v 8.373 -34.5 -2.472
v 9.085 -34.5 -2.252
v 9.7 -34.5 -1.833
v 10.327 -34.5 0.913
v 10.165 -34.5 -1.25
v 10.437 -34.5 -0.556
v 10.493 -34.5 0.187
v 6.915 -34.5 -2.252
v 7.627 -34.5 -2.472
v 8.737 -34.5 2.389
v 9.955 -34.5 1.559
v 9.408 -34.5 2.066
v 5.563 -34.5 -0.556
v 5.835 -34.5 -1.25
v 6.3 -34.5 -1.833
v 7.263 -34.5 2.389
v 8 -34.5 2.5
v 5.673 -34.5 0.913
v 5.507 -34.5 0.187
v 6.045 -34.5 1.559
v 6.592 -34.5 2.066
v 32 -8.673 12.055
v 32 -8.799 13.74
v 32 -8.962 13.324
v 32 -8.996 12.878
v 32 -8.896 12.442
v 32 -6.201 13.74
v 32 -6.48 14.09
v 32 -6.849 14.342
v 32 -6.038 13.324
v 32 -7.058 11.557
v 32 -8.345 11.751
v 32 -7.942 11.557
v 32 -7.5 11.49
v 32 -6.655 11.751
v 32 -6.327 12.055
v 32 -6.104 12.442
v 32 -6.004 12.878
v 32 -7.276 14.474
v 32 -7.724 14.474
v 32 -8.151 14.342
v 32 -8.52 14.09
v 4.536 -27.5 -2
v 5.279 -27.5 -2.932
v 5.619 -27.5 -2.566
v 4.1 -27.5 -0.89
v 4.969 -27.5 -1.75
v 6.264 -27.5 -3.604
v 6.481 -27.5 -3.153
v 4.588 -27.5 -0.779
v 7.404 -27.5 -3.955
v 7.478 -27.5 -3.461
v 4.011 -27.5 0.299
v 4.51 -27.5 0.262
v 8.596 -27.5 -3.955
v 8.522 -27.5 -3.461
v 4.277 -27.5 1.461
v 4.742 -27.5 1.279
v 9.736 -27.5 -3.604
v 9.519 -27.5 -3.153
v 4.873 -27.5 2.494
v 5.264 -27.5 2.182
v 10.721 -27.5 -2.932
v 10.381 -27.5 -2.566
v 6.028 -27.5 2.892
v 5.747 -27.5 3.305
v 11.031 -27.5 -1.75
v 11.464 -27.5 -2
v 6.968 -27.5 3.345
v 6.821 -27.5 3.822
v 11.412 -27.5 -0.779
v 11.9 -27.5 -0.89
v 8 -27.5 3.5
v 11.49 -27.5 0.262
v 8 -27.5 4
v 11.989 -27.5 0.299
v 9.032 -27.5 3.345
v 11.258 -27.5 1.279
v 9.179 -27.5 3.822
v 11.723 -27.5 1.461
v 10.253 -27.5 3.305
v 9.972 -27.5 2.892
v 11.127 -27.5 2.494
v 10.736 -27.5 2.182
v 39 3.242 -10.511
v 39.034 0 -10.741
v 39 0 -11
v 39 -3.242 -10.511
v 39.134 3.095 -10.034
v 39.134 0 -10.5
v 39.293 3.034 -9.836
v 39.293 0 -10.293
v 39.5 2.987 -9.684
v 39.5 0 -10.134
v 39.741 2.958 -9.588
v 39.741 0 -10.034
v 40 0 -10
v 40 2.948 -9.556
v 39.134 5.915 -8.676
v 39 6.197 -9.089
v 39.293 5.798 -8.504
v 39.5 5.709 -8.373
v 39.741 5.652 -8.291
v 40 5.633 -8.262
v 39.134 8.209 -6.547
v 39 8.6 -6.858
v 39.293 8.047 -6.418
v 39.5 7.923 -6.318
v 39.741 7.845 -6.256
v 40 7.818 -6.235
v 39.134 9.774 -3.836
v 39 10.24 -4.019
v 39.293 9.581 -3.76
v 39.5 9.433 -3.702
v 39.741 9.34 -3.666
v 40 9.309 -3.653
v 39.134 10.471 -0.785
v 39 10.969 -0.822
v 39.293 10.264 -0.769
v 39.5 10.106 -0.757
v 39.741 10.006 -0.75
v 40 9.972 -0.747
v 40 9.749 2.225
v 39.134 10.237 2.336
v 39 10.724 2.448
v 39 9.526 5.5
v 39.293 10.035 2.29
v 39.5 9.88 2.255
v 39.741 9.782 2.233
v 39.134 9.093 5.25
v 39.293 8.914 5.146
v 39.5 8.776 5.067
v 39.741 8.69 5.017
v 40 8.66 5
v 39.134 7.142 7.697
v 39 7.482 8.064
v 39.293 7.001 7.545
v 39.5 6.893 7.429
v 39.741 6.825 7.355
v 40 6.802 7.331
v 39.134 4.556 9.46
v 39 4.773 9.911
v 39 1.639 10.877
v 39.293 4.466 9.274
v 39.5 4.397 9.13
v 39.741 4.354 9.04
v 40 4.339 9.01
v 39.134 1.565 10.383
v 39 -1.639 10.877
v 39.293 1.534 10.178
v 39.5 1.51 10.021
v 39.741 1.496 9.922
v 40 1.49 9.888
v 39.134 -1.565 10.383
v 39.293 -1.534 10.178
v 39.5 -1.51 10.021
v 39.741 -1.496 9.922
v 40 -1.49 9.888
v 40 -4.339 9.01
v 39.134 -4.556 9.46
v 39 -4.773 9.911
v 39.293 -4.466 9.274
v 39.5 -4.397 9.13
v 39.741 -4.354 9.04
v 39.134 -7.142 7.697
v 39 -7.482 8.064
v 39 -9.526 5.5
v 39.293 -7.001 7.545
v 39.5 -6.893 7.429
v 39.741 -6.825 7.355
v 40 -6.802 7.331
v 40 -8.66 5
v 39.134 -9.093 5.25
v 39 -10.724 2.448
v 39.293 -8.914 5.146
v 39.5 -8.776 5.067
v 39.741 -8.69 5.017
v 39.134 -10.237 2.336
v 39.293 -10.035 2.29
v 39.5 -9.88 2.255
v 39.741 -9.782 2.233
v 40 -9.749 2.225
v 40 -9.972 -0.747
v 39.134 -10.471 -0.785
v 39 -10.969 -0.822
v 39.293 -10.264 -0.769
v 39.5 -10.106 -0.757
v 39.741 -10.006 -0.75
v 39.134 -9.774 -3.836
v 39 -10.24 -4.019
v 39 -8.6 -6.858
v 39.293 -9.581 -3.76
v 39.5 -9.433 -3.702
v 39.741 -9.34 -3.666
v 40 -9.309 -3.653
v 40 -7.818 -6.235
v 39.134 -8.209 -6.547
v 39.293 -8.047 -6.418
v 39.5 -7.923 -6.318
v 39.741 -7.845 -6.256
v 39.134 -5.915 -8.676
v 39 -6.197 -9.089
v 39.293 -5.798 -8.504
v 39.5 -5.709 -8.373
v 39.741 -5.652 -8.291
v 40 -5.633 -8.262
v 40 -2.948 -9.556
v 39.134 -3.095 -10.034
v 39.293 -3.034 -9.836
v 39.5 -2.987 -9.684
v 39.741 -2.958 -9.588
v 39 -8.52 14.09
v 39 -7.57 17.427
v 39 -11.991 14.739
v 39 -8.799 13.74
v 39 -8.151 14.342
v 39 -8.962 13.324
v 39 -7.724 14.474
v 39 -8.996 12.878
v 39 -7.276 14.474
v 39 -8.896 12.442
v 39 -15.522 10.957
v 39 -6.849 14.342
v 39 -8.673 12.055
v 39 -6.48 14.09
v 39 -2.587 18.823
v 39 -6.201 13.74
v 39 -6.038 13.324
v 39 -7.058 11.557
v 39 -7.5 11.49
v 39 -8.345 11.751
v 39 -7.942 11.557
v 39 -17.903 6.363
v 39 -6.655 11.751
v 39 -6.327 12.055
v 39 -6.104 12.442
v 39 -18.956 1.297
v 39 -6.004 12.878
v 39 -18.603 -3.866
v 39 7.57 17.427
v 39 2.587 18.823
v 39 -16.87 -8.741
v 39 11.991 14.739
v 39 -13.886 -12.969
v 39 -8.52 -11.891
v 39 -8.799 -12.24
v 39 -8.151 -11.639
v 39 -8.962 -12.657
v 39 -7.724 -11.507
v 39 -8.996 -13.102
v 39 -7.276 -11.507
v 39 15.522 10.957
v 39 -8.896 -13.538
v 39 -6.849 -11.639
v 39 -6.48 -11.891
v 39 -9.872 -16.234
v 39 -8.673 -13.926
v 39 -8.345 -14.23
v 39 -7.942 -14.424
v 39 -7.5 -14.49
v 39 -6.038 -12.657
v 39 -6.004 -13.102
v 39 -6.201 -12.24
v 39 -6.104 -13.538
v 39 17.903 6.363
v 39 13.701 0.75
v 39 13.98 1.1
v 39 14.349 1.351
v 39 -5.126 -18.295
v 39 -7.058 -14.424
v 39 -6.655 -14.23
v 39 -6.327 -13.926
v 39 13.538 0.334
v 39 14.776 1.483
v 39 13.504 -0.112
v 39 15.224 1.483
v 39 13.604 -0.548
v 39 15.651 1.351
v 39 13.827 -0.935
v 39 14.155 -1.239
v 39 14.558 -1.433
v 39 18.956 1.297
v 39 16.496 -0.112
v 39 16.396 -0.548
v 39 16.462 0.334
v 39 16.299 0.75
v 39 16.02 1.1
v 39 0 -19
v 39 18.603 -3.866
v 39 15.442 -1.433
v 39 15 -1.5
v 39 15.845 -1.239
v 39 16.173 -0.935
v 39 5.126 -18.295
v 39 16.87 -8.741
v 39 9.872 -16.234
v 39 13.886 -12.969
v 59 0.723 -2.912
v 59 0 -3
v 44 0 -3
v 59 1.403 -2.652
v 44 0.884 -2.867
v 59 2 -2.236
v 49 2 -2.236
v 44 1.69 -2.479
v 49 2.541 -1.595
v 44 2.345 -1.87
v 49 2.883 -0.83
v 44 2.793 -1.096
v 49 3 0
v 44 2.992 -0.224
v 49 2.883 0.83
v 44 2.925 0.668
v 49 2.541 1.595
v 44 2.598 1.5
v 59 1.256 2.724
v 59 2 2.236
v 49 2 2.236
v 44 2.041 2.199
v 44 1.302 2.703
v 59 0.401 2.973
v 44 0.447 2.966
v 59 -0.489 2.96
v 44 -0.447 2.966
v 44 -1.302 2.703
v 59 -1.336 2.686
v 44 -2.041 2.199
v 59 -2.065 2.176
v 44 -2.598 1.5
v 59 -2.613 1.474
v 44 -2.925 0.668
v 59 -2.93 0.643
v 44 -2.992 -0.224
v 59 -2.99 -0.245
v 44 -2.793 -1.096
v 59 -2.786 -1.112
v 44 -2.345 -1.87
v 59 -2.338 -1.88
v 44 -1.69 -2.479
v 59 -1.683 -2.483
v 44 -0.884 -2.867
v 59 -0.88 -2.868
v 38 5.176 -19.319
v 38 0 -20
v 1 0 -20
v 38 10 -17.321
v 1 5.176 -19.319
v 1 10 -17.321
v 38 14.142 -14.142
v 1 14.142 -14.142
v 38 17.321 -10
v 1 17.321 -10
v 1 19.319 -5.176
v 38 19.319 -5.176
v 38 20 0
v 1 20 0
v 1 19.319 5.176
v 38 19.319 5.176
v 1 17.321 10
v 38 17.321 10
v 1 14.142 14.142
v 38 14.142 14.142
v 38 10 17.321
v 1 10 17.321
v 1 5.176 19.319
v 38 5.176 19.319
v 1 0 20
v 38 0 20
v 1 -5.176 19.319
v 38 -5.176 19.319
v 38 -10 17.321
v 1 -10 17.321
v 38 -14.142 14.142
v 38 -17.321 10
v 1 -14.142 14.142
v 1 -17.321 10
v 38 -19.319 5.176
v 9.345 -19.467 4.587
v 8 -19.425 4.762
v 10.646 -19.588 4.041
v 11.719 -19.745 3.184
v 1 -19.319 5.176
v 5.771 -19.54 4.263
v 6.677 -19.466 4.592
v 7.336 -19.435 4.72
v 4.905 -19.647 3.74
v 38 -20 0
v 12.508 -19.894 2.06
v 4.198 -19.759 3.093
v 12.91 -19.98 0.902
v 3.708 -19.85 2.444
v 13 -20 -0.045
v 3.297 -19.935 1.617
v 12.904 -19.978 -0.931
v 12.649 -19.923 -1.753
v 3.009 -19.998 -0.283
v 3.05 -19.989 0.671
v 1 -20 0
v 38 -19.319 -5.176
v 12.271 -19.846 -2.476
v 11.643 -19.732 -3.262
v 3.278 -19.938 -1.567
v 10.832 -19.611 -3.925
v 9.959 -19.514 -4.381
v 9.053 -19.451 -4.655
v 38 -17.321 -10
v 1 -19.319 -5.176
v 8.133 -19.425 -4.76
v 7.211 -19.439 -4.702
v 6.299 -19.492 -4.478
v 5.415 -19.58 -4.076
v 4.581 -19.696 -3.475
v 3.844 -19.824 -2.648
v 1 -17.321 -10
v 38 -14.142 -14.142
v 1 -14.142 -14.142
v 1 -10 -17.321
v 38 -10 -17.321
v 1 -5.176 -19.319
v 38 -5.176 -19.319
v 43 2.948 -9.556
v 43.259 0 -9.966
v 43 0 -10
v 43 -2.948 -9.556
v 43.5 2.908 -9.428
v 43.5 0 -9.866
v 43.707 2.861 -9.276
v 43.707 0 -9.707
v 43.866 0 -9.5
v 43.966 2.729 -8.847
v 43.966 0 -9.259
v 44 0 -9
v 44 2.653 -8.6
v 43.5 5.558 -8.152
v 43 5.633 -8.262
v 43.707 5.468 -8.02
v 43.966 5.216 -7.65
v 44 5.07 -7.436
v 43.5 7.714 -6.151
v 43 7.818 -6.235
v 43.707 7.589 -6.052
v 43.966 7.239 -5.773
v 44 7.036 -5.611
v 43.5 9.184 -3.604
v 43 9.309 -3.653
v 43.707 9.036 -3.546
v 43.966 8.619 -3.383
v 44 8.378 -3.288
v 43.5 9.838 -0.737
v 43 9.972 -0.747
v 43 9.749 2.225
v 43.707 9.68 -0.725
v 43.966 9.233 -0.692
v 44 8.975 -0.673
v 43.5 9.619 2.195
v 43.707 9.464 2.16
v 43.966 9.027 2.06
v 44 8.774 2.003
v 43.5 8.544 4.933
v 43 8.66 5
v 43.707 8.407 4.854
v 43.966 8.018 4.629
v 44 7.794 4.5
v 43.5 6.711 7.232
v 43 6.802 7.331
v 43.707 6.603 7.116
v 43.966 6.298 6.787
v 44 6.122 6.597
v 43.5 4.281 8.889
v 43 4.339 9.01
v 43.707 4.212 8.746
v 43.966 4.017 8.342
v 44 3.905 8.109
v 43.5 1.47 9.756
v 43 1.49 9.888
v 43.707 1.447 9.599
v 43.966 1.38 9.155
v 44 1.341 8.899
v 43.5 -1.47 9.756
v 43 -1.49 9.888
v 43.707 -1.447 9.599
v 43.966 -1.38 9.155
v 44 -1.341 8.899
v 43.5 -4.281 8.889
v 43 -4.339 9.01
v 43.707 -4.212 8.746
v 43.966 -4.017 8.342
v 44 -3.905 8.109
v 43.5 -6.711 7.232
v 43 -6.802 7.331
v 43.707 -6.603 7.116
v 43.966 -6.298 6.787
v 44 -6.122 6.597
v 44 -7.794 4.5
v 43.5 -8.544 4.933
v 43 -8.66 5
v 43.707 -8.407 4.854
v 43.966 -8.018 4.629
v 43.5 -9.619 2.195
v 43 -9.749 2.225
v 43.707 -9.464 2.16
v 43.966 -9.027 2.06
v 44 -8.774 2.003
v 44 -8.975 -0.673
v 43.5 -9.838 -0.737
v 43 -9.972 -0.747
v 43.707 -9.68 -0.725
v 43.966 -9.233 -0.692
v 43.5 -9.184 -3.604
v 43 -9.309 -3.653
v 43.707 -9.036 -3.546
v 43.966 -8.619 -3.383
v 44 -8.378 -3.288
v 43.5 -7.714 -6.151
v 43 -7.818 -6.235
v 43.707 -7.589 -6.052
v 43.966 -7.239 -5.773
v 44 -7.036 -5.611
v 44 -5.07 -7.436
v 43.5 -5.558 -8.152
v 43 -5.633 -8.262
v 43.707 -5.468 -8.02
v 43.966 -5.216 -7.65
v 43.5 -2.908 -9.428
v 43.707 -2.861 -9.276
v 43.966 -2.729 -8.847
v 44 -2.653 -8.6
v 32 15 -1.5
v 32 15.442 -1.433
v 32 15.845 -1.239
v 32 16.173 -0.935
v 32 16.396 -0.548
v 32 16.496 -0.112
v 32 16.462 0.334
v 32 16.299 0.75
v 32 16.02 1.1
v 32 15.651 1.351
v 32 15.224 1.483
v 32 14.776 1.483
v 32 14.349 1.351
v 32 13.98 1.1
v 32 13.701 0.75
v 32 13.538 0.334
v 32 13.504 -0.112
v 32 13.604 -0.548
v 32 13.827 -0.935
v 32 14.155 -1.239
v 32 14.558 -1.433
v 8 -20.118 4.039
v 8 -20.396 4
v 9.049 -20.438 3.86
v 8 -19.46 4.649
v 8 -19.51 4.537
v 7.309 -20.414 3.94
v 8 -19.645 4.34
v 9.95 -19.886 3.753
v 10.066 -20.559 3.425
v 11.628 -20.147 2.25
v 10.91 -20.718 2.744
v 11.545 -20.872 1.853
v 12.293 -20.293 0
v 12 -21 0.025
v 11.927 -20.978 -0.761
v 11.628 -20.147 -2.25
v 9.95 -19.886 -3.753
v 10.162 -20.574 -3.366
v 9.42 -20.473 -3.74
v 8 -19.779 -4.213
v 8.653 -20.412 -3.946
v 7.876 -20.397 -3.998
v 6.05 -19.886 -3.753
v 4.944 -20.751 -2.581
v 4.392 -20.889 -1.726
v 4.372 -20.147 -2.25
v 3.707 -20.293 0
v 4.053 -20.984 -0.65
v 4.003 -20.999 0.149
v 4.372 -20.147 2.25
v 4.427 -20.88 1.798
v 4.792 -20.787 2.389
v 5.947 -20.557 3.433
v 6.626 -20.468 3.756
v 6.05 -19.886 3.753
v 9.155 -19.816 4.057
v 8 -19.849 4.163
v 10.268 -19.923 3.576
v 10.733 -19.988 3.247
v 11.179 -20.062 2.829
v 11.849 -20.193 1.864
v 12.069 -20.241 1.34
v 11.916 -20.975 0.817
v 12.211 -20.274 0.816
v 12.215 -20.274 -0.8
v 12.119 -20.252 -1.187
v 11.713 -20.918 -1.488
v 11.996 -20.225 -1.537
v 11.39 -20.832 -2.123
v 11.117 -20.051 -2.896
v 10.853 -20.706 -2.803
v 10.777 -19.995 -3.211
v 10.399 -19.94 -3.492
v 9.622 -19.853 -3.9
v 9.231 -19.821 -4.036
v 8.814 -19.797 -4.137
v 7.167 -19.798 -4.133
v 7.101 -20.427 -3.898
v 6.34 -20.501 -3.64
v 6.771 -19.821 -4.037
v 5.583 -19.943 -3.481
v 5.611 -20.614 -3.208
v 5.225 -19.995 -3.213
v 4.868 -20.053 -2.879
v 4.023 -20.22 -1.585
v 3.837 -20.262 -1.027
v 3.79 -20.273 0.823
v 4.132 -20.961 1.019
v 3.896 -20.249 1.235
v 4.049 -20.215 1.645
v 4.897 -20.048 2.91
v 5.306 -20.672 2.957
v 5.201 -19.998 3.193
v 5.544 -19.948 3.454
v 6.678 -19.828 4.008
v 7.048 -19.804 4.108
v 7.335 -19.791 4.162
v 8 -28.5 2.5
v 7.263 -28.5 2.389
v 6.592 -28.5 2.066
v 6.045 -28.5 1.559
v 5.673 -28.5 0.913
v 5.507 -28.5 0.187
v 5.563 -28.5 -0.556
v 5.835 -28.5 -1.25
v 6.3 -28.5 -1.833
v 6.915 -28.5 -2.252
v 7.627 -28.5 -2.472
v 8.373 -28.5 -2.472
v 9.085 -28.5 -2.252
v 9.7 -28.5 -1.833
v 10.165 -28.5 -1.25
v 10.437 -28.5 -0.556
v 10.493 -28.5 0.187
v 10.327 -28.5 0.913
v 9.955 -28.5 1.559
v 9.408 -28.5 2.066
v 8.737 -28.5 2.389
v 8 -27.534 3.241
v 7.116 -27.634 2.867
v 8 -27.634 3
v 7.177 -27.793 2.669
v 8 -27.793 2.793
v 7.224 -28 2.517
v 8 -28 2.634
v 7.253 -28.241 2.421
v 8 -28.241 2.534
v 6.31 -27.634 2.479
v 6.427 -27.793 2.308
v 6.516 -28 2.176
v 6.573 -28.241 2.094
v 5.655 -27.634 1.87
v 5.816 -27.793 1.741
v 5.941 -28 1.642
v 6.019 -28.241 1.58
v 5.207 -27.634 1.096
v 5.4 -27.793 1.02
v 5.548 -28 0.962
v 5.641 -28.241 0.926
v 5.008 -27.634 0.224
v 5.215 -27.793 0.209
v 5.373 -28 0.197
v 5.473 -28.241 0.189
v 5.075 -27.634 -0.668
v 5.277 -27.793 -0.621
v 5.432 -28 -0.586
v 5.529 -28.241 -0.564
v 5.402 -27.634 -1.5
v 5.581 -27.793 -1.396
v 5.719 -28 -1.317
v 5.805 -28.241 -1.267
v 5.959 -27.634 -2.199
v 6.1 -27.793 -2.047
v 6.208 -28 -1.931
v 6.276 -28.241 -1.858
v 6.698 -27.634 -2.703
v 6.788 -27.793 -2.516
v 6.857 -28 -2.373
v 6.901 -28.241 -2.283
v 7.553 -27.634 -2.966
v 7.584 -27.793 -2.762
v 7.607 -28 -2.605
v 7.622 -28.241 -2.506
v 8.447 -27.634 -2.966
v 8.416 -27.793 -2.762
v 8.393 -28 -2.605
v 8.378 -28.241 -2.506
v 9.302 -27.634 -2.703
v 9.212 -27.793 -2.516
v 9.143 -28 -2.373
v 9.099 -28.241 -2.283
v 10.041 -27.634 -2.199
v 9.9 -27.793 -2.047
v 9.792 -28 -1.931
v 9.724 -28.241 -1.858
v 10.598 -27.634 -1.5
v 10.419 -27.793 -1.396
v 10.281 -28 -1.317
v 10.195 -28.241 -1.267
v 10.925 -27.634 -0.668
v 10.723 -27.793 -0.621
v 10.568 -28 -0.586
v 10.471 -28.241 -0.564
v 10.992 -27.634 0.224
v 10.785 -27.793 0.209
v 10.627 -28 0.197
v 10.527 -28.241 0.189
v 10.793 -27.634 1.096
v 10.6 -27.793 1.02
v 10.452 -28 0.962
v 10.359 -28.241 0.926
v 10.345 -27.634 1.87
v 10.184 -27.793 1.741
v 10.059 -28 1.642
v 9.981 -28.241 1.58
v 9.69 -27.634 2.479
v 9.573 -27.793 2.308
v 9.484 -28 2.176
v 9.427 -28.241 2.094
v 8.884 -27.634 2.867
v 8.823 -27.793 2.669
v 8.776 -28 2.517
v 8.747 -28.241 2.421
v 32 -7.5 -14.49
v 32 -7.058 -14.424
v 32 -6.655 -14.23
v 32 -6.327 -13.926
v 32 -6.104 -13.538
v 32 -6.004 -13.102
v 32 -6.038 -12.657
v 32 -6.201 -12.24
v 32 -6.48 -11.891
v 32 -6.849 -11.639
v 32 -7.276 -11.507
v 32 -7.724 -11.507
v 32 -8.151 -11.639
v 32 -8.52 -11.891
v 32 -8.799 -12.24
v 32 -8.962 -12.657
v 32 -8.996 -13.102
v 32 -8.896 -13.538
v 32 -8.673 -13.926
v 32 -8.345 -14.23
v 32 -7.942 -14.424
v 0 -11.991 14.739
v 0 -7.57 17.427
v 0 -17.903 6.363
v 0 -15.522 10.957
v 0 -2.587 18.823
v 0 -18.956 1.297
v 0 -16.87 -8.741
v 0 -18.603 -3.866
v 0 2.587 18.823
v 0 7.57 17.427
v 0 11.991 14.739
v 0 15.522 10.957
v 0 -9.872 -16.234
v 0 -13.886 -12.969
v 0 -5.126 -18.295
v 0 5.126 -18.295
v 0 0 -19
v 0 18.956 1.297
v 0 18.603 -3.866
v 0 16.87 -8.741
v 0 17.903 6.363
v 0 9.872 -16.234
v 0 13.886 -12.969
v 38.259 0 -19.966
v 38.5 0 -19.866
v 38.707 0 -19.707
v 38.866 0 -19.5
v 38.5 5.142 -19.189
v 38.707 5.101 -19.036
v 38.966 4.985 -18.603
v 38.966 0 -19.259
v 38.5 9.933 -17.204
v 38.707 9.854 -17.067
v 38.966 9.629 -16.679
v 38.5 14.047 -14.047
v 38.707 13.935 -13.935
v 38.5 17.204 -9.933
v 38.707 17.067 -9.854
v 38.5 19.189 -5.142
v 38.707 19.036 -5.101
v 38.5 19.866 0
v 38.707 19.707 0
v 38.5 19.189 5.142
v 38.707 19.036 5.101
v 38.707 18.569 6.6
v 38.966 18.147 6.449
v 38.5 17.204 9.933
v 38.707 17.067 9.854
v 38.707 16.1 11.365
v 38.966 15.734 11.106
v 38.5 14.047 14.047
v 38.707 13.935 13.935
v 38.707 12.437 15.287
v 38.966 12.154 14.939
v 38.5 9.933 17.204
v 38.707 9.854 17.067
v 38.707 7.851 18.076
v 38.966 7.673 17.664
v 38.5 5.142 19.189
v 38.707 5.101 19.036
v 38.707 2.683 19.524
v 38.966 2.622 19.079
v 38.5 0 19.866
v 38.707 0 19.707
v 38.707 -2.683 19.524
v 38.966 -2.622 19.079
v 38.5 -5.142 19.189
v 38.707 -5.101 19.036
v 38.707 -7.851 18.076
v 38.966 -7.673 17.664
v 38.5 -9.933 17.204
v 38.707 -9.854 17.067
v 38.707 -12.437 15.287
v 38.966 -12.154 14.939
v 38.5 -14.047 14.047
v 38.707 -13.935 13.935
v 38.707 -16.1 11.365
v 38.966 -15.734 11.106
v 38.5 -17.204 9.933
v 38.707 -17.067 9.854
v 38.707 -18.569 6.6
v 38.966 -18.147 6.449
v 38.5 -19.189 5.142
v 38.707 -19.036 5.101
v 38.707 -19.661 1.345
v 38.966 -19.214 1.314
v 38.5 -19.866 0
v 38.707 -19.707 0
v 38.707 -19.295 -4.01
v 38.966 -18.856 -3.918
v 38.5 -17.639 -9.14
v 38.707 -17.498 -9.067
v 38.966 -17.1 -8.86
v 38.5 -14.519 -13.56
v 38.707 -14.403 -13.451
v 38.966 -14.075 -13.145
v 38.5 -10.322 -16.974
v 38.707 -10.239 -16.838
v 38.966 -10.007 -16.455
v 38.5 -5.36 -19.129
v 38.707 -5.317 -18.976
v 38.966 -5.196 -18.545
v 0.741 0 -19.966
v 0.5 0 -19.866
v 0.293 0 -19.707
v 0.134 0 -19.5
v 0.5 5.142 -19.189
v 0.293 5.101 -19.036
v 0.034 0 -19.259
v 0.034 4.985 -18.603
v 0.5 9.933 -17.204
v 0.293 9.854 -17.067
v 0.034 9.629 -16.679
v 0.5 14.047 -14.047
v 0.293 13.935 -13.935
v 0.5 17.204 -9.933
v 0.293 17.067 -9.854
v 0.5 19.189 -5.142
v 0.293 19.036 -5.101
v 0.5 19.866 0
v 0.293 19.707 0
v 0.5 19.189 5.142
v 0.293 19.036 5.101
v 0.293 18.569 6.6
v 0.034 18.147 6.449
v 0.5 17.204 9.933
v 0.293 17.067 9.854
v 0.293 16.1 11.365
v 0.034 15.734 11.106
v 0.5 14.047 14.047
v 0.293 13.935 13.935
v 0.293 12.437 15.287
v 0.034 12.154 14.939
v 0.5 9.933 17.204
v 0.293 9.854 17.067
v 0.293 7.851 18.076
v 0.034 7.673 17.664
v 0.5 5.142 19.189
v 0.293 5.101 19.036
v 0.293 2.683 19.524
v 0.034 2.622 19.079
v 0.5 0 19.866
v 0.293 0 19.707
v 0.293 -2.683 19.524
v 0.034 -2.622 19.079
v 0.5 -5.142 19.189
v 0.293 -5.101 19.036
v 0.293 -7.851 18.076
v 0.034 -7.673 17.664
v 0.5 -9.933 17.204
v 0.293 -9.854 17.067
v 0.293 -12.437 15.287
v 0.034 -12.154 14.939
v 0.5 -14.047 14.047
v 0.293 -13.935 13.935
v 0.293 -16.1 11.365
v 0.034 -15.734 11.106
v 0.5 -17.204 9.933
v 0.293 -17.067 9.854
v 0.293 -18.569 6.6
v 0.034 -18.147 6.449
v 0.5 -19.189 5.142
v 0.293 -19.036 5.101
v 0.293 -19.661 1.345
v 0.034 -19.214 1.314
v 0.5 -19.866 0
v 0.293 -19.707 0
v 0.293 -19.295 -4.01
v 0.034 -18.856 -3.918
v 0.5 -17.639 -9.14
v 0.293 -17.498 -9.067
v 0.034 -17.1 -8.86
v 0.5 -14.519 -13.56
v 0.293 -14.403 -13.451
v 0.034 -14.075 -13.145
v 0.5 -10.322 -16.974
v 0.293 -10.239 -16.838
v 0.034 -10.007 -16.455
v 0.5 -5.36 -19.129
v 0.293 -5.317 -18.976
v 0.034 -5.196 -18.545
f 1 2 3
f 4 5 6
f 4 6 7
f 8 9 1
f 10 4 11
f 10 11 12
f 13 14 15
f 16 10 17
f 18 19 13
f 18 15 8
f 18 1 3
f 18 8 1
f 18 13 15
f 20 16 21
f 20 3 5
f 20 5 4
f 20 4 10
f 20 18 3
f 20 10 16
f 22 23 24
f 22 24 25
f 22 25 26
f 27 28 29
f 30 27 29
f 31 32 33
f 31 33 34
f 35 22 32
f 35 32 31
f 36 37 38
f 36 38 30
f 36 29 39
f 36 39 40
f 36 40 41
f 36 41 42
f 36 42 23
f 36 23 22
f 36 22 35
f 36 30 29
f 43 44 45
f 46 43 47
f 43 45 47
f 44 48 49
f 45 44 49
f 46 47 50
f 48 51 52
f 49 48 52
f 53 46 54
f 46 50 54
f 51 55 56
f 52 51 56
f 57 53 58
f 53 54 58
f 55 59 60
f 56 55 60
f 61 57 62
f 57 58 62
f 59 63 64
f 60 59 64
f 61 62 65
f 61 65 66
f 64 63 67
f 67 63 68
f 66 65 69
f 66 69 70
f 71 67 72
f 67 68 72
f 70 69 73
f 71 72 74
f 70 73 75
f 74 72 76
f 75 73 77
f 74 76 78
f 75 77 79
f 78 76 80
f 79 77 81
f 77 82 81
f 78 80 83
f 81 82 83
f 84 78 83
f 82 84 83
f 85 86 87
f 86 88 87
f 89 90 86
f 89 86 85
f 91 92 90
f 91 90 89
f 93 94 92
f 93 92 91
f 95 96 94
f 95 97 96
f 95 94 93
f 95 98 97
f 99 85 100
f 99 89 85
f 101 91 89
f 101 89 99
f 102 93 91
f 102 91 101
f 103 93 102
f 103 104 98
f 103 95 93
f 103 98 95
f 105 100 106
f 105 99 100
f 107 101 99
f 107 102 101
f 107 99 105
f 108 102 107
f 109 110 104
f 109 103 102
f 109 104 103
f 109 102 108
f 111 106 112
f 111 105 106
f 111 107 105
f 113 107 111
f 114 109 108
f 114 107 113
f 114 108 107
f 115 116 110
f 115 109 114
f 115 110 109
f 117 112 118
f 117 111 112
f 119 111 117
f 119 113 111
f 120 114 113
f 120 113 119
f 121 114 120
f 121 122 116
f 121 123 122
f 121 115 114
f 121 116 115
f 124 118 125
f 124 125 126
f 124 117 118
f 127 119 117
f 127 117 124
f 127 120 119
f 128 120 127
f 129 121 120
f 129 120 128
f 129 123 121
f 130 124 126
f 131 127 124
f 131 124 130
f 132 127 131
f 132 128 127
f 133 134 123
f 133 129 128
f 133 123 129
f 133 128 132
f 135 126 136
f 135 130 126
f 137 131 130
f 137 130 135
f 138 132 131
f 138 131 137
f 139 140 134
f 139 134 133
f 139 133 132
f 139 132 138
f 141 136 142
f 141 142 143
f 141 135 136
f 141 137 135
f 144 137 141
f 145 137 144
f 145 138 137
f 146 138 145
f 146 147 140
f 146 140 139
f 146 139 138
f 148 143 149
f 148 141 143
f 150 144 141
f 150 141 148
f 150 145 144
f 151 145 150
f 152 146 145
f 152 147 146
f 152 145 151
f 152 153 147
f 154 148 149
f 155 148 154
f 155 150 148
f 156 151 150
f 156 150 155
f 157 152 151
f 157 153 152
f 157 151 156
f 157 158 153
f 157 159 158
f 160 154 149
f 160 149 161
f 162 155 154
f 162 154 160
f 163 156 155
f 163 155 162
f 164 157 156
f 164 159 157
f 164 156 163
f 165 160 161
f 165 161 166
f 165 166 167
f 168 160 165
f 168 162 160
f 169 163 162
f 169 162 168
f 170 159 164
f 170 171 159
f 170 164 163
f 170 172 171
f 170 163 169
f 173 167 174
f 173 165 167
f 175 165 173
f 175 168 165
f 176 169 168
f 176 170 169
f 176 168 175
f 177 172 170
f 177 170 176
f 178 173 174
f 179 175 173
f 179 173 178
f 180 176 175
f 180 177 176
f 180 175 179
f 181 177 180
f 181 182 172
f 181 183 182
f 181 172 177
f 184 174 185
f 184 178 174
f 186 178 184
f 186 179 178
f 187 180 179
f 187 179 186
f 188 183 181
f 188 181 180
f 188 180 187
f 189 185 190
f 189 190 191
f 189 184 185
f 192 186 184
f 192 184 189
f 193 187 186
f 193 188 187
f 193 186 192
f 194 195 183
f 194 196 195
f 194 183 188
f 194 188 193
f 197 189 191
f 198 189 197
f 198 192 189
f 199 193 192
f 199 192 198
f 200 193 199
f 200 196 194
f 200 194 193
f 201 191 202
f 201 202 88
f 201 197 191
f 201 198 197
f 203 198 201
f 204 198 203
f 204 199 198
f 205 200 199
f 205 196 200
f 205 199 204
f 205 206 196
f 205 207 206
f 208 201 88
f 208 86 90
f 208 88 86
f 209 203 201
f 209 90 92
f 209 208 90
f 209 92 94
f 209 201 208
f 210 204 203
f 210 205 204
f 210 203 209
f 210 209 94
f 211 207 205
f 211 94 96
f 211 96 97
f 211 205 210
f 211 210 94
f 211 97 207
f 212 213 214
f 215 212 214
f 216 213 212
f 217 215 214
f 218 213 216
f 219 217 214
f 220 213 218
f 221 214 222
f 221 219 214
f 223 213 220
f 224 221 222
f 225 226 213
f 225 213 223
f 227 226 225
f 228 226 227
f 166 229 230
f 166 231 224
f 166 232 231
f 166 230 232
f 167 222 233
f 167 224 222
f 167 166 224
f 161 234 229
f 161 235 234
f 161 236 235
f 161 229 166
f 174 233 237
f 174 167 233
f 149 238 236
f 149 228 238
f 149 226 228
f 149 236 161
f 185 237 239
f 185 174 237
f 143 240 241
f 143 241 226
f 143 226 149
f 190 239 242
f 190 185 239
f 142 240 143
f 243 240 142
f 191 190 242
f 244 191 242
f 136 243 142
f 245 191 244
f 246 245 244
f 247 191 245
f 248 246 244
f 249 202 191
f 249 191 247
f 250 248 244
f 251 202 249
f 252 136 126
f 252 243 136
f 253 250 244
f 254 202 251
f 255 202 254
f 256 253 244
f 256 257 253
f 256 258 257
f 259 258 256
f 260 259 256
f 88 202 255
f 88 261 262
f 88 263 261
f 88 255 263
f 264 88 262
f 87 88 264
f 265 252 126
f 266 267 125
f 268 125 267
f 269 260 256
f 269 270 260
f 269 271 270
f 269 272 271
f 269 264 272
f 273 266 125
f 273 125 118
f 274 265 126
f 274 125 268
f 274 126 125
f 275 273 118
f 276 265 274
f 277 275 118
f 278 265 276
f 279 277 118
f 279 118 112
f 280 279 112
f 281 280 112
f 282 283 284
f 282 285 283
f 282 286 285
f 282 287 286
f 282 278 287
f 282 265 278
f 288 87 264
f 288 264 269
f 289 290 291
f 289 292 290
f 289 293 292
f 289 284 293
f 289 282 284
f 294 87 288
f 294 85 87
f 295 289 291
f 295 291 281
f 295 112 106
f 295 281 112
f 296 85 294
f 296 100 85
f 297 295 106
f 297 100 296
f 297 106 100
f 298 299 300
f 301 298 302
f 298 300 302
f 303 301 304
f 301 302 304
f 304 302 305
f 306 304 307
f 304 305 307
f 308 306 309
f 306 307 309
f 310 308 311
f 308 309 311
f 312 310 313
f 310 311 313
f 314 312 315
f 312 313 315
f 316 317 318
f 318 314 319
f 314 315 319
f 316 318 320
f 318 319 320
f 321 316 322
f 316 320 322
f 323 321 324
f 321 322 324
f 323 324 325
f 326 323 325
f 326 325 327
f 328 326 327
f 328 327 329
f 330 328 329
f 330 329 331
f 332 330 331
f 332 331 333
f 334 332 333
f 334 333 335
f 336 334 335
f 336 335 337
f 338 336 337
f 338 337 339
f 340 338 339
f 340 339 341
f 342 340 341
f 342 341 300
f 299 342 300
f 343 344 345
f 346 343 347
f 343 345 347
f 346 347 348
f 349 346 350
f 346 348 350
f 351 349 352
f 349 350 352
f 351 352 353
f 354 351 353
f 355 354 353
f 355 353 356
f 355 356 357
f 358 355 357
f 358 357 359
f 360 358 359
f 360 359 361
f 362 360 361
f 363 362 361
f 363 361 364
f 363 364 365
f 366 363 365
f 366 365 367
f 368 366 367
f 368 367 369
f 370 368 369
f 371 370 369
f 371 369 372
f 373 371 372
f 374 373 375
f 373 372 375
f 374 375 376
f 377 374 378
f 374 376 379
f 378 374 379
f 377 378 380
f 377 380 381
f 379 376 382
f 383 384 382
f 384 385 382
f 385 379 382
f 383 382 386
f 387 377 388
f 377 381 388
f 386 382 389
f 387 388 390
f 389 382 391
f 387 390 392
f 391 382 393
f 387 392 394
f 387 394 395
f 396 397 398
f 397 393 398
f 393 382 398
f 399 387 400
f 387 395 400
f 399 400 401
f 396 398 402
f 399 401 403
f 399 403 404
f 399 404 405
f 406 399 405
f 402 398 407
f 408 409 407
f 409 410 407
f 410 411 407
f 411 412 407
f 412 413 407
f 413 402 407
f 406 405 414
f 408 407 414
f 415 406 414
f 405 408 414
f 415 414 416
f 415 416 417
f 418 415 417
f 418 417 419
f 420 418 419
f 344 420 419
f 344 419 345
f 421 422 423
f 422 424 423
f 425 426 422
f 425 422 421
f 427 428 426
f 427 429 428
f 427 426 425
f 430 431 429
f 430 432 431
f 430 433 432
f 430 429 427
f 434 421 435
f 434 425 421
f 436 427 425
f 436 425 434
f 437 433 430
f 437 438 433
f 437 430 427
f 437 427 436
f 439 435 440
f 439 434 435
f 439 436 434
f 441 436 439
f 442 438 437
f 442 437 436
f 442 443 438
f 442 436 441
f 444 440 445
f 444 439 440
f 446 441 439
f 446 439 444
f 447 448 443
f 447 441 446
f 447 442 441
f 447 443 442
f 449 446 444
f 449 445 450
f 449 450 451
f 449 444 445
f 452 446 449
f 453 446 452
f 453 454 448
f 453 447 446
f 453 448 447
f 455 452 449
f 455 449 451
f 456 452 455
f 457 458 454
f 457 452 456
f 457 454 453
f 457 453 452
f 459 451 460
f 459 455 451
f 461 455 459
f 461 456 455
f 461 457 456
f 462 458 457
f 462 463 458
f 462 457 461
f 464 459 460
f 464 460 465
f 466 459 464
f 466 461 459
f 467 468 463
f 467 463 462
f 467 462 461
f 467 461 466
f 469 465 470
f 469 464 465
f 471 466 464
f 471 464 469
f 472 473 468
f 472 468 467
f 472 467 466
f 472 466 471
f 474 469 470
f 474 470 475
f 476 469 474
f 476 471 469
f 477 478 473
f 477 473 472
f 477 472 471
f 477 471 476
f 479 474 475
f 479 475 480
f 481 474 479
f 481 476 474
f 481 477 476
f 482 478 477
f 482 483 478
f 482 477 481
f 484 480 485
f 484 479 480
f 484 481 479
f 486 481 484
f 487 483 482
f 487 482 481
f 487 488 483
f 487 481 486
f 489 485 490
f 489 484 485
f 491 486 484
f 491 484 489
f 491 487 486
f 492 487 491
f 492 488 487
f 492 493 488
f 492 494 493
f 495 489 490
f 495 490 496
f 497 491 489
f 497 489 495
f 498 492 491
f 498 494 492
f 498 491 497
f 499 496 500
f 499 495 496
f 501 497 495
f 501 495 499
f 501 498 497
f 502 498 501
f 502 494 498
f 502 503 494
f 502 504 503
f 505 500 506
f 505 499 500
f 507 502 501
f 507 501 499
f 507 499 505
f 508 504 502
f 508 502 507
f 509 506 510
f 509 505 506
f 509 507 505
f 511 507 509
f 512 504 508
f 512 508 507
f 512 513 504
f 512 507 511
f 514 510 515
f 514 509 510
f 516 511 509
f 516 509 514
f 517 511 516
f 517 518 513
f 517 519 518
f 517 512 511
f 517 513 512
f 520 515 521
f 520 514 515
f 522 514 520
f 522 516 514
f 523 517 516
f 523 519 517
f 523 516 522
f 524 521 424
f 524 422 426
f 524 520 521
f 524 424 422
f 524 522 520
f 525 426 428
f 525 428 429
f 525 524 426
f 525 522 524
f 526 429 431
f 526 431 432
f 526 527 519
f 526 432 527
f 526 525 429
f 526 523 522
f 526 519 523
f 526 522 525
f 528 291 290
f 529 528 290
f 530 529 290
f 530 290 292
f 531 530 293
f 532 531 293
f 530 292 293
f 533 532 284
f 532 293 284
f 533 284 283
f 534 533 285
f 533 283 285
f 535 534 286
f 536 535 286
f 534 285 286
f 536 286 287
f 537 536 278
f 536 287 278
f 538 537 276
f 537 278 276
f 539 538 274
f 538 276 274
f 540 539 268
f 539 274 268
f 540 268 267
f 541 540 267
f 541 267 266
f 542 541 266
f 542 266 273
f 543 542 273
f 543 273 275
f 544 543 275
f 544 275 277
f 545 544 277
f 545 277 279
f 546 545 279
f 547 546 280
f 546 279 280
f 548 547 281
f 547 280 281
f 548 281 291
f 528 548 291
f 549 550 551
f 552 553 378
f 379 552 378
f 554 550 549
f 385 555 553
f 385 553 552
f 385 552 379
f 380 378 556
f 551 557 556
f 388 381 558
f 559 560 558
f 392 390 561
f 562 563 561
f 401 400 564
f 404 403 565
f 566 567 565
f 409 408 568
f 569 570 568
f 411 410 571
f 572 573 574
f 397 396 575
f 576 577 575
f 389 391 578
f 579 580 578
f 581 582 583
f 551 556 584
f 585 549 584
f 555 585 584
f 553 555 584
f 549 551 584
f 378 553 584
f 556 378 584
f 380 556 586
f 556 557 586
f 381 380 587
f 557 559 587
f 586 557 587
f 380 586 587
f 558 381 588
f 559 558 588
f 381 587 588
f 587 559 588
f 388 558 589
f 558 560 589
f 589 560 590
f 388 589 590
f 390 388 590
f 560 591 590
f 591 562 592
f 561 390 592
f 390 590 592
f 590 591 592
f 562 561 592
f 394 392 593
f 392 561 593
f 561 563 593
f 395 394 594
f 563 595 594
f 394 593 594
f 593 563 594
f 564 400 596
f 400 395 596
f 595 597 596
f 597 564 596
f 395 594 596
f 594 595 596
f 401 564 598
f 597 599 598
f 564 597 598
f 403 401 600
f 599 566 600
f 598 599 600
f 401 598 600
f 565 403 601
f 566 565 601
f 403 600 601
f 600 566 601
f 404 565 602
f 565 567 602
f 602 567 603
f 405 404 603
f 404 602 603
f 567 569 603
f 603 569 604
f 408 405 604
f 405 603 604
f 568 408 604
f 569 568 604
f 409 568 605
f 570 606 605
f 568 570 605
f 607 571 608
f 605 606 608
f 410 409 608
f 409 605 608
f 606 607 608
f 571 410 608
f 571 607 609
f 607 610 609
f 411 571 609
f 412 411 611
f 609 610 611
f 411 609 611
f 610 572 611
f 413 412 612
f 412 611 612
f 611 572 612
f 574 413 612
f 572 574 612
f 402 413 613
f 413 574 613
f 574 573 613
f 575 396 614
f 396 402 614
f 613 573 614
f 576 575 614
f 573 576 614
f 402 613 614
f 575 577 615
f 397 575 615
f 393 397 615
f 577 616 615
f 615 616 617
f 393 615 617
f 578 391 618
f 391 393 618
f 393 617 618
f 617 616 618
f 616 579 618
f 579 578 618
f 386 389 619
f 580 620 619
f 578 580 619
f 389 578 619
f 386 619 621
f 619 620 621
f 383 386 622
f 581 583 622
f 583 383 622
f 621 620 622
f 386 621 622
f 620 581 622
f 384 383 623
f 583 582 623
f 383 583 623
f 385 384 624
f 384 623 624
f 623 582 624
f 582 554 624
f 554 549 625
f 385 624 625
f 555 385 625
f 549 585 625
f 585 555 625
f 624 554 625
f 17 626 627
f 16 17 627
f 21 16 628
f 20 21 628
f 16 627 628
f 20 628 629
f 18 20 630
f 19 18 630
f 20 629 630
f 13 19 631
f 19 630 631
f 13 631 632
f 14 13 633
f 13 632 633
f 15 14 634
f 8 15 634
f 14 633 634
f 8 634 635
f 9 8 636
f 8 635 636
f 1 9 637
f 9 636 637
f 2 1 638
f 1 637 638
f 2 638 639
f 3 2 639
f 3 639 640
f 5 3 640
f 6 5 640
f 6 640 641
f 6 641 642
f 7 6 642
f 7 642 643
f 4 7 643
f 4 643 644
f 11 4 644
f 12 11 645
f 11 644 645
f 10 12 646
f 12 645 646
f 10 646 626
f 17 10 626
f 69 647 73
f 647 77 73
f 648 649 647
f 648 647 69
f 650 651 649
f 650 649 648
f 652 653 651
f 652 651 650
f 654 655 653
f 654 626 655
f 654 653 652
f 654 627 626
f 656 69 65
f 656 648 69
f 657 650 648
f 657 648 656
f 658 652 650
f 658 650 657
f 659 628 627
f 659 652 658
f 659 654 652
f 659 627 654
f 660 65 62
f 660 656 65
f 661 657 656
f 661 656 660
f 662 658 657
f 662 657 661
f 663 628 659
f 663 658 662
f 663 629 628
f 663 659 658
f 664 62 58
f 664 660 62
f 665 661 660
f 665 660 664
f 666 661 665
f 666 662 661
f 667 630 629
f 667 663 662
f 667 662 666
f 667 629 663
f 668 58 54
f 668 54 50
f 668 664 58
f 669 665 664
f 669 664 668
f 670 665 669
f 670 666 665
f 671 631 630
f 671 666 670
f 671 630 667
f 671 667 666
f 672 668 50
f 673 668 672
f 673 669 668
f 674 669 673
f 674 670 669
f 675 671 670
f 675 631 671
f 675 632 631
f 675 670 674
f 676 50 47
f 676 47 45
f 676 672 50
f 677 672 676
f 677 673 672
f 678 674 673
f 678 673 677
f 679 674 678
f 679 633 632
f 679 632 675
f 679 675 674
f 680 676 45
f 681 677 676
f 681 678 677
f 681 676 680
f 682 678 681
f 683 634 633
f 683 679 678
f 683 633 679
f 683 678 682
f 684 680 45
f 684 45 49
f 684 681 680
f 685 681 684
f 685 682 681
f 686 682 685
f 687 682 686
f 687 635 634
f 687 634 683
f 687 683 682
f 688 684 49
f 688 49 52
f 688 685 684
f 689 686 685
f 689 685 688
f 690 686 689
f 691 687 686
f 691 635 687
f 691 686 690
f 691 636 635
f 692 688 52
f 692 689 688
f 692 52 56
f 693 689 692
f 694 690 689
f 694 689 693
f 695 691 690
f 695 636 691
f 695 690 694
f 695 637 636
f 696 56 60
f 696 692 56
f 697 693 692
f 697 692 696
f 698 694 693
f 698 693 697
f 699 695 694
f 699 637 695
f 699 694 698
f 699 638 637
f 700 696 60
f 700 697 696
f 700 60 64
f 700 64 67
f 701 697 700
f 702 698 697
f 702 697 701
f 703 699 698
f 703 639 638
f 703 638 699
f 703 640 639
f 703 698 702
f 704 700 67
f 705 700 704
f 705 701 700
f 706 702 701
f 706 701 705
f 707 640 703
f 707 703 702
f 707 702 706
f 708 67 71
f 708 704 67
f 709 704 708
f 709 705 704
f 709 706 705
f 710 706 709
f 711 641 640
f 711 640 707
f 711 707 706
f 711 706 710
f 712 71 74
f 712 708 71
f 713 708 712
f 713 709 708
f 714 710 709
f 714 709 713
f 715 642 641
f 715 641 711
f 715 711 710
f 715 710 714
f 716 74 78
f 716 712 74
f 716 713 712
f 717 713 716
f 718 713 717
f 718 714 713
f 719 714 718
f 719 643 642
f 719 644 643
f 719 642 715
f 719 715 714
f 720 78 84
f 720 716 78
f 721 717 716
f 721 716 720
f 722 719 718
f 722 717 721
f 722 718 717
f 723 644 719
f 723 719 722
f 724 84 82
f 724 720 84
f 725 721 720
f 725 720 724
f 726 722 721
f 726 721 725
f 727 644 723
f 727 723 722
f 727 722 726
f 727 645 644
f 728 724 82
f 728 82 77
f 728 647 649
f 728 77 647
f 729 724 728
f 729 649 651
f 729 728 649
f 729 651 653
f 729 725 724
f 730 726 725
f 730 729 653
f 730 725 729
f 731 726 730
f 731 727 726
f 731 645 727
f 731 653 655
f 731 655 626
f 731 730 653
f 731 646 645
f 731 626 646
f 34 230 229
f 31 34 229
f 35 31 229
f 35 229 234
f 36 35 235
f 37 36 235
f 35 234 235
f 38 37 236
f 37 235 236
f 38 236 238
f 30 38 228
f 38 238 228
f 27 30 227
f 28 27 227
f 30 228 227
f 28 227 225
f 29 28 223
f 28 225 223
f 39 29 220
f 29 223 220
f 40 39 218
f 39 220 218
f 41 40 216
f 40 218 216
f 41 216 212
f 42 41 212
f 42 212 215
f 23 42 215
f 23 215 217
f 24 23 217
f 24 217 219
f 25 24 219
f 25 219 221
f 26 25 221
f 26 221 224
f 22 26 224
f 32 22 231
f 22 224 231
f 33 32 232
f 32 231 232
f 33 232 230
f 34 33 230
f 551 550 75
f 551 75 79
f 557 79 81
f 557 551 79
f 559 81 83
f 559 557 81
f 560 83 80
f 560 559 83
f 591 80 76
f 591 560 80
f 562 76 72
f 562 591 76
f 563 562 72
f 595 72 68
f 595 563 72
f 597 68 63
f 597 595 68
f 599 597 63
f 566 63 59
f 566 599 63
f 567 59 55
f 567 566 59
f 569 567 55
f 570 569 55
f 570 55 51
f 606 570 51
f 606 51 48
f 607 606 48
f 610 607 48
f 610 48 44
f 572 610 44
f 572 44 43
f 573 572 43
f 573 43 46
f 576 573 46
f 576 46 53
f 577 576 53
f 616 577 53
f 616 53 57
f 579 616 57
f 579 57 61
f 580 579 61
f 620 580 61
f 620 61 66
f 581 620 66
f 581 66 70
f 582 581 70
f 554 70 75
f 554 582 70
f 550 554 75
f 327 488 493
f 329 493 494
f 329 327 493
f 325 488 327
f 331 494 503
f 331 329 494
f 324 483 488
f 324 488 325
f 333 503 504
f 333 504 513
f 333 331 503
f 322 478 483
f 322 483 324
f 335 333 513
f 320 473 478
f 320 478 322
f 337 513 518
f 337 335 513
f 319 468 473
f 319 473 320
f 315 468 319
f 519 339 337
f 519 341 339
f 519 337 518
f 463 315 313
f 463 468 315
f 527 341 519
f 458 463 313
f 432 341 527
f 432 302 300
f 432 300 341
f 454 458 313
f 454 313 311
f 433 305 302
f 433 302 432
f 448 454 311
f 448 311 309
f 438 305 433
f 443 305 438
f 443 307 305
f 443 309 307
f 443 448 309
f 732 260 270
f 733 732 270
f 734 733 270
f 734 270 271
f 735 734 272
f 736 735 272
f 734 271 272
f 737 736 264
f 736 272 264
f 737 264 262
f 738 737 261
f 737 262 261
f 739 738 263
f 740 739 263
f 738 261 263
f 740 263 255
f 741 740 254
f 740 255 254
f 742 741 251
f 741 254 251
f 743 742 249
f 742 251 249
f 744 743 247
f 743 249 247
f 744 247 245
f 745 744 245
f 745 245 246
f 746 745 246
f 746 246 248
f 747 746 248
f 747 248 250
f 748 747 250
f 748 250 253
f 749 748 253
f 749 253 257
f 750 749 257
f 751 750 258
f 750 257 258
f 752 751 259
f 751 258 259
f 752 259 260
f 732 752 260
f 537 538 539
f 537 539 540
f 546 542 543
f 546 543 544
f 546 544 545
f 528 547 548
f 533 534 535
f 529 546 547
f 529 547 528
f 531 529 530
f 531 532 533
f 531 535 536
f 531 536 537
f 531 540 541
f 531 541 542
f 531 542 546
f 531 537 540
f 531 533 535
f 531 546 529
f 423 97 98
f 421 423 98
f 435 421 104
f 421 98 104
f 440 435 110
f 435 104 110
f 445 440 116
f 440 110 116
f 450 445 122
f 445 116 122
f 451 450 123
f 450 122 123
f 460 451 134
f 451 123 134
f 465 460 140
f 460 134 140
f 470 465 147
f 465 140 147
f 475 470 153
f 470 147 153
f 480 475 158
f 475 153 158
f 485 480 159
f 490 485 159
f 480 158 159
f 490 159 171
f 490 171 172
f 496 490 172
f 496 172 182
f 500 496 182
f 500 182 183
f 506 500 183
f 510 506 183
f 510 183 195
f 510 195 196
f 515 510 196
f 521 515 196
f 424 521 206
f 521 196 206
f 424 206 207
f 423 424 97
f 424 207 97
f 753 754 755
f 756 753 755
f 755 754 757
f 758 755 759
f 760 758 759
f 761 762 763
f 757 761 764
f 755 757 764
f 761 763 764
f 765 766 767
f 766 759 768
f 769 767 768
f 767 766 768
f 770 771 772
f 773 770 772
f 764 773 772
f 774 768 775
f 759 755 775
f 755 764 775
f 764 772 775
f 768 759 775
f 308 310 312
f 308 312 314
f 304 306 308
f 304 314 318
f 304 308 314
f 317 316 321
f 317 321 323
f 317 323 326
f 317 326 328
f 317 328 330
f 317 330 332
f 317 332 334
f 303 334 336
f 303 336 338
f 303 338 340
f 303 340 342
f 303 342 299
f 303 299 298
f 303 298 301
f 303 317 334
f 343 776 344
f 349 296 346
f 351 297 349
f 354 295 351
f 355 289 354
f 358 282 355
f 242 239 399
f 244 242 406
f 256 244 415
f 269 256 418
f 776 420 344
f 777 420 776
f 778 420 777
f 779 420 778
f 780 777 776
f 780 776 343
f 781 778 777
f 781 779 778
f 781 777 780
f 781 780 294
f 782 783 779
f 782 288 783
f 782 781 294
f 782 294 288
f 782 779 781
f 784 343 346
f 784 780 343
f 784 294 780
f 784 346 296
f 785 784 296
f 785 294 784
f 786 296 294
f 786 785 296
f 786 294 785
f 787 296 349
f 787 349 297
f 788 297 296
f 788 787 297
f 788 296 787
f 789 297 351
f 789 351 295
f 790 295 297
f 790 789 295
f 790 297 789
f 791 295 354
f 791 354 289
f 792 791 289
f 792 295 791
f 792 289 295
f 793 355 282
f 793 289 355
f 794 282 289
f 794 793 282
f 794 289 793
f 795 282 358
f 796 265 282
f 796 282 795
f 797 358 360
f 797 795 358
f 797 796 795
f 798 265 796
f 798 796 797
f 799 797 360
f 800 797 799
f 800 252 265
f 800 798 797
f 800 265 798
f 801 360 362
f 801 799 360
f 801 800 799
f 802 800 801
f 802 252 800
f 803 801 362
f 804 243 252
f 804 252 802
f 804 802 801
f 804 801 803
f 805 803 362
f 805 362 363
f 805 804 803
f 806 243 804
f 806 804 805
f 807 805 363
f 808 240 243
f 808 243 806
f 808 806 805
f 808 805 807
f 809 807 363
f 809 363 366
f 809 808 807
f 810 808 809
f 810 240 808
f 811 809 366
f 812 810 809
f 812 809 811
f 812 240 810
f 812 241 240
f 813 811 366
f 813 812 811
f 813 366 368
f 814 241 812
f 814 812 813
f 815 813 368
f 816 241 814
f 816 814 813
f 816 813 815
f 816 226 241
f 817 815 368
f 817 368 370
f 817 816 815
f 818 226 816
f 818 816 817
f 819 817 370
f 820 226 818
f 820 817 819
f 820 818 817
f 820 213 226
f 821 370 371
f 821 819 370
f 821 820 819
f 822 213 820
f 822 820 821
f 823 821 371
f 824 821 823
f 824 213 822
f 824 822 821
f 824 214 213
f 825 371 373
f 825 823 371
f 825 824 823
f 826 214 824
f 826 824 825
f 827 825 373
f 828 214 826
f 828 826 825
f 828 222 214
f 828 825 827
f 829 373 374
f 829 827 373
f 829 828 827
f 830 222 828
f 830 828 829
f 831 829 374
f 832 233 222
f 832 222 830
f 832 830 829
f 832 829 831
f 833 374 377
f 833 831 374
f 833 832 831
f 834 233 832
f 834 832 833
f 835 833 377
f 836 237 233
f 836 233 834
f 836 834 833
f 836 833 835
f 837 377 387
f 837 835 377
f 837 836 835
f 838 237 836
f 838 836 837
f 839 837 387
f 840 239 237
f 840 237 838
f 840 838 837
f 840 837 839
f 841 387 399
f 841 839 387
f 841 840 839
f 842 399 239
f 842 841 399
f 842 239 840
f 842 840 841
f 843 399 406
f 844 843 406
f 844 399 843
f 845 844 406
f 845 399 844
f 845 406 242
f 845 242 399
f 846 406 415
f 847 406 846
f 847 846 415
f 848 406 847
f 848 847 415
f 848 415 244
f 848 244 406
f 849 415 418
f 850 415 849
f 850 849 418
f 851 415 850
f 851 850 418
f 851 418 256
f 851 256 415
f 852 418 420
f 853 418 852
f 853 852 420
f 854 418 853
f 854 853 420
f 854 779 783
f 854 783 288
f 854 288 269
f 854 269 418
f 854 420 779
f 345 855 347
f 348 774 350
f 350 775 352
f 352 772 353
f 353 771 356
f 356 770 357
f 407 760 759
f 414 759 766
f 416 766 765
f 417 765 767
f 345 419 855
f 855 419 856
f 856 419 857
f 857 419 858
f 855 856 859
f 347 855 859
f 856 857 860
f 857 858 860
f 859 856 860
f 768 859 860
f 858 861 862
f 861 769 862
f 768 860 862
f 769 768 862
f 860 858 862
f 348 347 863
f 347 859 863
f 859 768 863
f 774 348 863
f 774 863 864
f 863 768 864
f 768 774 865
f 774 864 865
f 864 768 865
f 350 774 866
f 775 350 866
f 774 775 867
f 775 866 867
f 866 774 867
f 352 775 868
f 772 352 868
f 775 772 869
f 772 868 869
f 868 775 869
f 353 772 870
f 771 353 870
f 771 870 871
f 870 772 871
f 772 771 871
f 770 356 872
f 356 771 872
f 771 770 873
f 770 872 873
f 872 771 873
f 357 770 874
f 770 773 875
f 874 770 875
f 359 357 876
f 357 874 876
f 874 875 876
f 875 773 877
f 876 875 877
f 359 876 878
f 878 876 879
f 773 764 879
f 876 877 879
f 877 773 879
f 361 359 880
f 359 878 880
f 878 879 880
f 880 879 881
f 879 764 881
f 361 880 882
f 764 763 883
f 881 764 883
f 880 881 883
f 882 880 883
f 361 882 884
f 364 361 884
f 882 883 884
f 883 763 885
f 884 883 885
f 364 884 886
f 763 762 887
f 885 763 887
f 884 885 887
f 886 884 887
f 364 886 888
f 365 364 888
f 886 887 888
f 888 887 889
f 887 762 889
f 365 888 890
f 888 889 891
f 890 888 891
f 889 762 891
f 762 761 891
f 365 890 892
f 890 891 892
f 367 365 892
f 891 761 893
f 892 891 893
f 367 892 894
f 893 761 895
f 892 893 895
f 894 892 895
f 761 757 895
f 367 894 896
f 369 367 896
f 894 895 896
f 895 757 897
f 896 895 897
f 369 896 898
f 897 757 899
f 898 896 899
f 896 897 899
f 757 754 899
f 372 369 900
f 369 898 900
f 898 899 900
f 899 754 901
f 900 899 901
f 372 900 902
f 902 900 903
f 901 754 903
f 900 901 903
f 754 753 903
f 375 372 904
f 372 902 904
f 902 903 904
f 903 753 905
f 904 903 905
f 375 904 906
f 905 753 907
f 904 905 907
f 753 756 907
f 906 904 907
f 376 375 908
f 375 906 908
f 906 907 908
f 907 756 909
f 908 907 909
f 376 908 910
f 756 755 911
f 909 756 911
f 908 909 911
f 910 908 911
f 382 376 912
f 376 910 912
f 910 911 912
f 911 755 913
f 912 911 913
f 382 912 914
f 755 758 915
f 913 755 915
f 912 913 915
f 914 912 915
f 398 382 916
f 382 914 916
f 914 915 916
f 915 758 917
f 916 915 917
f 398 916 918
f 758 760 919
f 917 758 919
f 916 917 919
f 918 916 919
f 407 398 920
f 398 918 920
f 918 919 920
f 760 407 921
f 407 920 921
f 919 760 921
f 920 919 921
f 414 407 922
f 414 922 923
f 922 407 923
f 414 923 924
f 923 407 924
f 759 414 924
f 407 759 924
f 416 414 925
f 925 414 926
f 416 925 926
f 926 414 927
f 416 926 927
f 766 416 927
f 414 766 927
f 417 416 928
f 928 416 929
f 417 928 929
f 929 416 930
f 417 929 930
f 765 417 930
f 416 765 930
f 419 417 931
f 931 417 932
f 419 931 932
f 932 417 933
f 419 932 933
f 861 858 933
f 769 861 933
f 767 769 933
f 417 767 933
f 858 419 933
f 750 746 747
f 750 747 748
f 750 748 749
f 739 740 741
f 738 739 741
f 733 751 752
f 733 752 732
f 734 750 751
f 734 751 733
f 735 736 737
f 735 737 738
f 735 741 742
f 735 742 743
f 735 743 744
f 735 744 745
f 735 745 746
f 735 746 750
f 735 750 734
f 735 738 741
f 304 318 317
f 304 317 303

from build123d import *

# Parameters (mm, degrees)
SKETCH2_R                       = 20
BOSS_EXTRUDE1_DEPTH             = 39
SKETCH3_R                       = 10
BOSS_EXTRUDE2_DEPTH             = 5
SKETCH4_R                       = 3
BOSS_EXTRUDE3_DEPTH             = 15
CUT_EXTRUDE1_START              = -10
CUT_EXTRUDE1_DEPTH              = 10
SKETCH6_R                       = 1.5
CUT_EXTRUDE2_DEPTH              = 7
BOSS_EXTRUDE4_REACH             = 76.034
BOSS_EXTRUDE4_END_RADIUS        = 20
SKETCH8_R                       = 4
BOSS_EXTRUDE4_DIRECTION_2_DEPTH = 7.5
SKETCH9_R                       = 2.5
BOSS_EXTRUDE5_DEPTH             = 7
FILLET1_R                       = 1


with BuildPart() as part:
    # Sketch2 → Boss-Extrude1 (new body)
    with BuildSketch(Plane(origin=(0, 0, 0), x_dir=(0, 0, -1), z_dir=(1, 0, 0))):
        Circle(SKETCH2_R)
    extrude(amount=BOSS_EXTRUDE1_DEPTH)

    # Sketch3 → Boss-Extrude2 (add)
    with BuildSketch(Plane(origin=(39, 0, 0), x_dir=(0, 0, -1), z_dir=(1, 0, 0))):
        Circle(SKETCH3_R)
    extrude(amount=BOSS_EXTRUDE2_DEPTH)

    # Sketch4 → Boss-Extrude3 (add)
    with BuildSketch(Plane(origin=(44, 0, 0), x_dir=(0, 0, -1), z_dir=(1, 0, 0))):
        Circle(SKETCH4_R)
    extrude(amount=BOSS_EXTRUDE3_DEPTH)

    # Sketch5 → Cut-Extrude1 (cut)
    with BuildSketch(Plane(origin=(59, 0, 0), x_dir=(0, 0, -1), z_dir=(1, 0, 0)).offset(CUT_EXTRUDE1_START)):
        with BuildLine():
            Line((-2.236067977, 2), (2.236067977, 2))
            ThreePointArc((2.236067977, 2), (0, 3), (-2.236067977, 2))
        make_face()
    extrude(amount=CUT_EXTRUDE1_DEPTH, mode=Mode.SUBTRACT)

    # Sketch6 → Cut-Extrude2 (cut)
    with BuildSketch(Plane(origin=(39, 0, 0), x_dir=(0, 0, -1), z_dir=(1, 0, 0))):
        with Locations((0, 15)):
            Circle(SKETCH6_R)
        with Locations((12.990381057, -7.5)):
            Circle(SKETCH6_R)
        with Locations((-12.990381057, -7.5)):
            Circle(SKETCH6_R)
    extrude(amount=-CUT_EXTRUDE2_DEPTH, mode=Mode.SUBTRACT)

    # Boss-Extrude4: up to this cylinder (the profile starts outside it)
    boss_extrude4_end = Plane(origin=(8, 0, 0), z_dir=(-1, 0, 0)) * Cylinder(BOSS_EXTRUDE4_END_RADIUS, 193.068, mode=Mode.PRIVATE)
    # Sketch8 → Boss-Extrude4 (add, up to the surface)
    with BuildSketch(Plane(origin=(0, -20, 0), x_dir=(1, 0, 0), z_dir=(0, 1, 0)), mode=Mode.PRIVATE) as boss_extrude4_sk1:
        with Locations((8, 0)):
            Circle(SKETCH8_R)
    boss_extrude4_tool1 = extrude(boss_extrude4_sk1.sketch, amount=BOSS_EXTRUDE4_REACH, mode=Mode.PRIVATE) - boss_extrude4_end
    add(boss_extrude4_tool1.solids().sort_by_distance((8, -20, 0))[0])
    add(boss_extrude4_tool1.solids().sort_by_distance((8, -20, 0))[1])

    # Sketch8 → Boss-Extrude4 direction 2 (add)
    with BuildSketch(Plane(origin=(0, -20, 0), x_dir=(1, 0, 0), z_dir=(0, 1, 0))):
        with Locations((8, 0)):
            Circle(SKETCH8_R)
    extrude(amount=-BOSS_EXTRUDE4_DIRECTION_2_DEPTH)

    # Sketch9 → Boss-Extrude5 (add)
    with BuildSketch(Plane.XZ.offset(27.5)):
        with Locations((8, 0)):
            Circle(SKETCH9_R)
    extrude(amount=BOSS_EXTRUDE5_DEPTH)

    # Fillet1
    fillet1_edges = [part.edges().sort_by_distance(p)[0] for p in [
        (0, 0, 20),
        (39, 0, 20),
        (4, -20, 0),
        (5.5, -27.5, 0),
        (39, 0, 10),
        (44, 0, 10),
    ]]
    fillet(fillet1_edges, radius=FILLET1_R)


solid = part.part
